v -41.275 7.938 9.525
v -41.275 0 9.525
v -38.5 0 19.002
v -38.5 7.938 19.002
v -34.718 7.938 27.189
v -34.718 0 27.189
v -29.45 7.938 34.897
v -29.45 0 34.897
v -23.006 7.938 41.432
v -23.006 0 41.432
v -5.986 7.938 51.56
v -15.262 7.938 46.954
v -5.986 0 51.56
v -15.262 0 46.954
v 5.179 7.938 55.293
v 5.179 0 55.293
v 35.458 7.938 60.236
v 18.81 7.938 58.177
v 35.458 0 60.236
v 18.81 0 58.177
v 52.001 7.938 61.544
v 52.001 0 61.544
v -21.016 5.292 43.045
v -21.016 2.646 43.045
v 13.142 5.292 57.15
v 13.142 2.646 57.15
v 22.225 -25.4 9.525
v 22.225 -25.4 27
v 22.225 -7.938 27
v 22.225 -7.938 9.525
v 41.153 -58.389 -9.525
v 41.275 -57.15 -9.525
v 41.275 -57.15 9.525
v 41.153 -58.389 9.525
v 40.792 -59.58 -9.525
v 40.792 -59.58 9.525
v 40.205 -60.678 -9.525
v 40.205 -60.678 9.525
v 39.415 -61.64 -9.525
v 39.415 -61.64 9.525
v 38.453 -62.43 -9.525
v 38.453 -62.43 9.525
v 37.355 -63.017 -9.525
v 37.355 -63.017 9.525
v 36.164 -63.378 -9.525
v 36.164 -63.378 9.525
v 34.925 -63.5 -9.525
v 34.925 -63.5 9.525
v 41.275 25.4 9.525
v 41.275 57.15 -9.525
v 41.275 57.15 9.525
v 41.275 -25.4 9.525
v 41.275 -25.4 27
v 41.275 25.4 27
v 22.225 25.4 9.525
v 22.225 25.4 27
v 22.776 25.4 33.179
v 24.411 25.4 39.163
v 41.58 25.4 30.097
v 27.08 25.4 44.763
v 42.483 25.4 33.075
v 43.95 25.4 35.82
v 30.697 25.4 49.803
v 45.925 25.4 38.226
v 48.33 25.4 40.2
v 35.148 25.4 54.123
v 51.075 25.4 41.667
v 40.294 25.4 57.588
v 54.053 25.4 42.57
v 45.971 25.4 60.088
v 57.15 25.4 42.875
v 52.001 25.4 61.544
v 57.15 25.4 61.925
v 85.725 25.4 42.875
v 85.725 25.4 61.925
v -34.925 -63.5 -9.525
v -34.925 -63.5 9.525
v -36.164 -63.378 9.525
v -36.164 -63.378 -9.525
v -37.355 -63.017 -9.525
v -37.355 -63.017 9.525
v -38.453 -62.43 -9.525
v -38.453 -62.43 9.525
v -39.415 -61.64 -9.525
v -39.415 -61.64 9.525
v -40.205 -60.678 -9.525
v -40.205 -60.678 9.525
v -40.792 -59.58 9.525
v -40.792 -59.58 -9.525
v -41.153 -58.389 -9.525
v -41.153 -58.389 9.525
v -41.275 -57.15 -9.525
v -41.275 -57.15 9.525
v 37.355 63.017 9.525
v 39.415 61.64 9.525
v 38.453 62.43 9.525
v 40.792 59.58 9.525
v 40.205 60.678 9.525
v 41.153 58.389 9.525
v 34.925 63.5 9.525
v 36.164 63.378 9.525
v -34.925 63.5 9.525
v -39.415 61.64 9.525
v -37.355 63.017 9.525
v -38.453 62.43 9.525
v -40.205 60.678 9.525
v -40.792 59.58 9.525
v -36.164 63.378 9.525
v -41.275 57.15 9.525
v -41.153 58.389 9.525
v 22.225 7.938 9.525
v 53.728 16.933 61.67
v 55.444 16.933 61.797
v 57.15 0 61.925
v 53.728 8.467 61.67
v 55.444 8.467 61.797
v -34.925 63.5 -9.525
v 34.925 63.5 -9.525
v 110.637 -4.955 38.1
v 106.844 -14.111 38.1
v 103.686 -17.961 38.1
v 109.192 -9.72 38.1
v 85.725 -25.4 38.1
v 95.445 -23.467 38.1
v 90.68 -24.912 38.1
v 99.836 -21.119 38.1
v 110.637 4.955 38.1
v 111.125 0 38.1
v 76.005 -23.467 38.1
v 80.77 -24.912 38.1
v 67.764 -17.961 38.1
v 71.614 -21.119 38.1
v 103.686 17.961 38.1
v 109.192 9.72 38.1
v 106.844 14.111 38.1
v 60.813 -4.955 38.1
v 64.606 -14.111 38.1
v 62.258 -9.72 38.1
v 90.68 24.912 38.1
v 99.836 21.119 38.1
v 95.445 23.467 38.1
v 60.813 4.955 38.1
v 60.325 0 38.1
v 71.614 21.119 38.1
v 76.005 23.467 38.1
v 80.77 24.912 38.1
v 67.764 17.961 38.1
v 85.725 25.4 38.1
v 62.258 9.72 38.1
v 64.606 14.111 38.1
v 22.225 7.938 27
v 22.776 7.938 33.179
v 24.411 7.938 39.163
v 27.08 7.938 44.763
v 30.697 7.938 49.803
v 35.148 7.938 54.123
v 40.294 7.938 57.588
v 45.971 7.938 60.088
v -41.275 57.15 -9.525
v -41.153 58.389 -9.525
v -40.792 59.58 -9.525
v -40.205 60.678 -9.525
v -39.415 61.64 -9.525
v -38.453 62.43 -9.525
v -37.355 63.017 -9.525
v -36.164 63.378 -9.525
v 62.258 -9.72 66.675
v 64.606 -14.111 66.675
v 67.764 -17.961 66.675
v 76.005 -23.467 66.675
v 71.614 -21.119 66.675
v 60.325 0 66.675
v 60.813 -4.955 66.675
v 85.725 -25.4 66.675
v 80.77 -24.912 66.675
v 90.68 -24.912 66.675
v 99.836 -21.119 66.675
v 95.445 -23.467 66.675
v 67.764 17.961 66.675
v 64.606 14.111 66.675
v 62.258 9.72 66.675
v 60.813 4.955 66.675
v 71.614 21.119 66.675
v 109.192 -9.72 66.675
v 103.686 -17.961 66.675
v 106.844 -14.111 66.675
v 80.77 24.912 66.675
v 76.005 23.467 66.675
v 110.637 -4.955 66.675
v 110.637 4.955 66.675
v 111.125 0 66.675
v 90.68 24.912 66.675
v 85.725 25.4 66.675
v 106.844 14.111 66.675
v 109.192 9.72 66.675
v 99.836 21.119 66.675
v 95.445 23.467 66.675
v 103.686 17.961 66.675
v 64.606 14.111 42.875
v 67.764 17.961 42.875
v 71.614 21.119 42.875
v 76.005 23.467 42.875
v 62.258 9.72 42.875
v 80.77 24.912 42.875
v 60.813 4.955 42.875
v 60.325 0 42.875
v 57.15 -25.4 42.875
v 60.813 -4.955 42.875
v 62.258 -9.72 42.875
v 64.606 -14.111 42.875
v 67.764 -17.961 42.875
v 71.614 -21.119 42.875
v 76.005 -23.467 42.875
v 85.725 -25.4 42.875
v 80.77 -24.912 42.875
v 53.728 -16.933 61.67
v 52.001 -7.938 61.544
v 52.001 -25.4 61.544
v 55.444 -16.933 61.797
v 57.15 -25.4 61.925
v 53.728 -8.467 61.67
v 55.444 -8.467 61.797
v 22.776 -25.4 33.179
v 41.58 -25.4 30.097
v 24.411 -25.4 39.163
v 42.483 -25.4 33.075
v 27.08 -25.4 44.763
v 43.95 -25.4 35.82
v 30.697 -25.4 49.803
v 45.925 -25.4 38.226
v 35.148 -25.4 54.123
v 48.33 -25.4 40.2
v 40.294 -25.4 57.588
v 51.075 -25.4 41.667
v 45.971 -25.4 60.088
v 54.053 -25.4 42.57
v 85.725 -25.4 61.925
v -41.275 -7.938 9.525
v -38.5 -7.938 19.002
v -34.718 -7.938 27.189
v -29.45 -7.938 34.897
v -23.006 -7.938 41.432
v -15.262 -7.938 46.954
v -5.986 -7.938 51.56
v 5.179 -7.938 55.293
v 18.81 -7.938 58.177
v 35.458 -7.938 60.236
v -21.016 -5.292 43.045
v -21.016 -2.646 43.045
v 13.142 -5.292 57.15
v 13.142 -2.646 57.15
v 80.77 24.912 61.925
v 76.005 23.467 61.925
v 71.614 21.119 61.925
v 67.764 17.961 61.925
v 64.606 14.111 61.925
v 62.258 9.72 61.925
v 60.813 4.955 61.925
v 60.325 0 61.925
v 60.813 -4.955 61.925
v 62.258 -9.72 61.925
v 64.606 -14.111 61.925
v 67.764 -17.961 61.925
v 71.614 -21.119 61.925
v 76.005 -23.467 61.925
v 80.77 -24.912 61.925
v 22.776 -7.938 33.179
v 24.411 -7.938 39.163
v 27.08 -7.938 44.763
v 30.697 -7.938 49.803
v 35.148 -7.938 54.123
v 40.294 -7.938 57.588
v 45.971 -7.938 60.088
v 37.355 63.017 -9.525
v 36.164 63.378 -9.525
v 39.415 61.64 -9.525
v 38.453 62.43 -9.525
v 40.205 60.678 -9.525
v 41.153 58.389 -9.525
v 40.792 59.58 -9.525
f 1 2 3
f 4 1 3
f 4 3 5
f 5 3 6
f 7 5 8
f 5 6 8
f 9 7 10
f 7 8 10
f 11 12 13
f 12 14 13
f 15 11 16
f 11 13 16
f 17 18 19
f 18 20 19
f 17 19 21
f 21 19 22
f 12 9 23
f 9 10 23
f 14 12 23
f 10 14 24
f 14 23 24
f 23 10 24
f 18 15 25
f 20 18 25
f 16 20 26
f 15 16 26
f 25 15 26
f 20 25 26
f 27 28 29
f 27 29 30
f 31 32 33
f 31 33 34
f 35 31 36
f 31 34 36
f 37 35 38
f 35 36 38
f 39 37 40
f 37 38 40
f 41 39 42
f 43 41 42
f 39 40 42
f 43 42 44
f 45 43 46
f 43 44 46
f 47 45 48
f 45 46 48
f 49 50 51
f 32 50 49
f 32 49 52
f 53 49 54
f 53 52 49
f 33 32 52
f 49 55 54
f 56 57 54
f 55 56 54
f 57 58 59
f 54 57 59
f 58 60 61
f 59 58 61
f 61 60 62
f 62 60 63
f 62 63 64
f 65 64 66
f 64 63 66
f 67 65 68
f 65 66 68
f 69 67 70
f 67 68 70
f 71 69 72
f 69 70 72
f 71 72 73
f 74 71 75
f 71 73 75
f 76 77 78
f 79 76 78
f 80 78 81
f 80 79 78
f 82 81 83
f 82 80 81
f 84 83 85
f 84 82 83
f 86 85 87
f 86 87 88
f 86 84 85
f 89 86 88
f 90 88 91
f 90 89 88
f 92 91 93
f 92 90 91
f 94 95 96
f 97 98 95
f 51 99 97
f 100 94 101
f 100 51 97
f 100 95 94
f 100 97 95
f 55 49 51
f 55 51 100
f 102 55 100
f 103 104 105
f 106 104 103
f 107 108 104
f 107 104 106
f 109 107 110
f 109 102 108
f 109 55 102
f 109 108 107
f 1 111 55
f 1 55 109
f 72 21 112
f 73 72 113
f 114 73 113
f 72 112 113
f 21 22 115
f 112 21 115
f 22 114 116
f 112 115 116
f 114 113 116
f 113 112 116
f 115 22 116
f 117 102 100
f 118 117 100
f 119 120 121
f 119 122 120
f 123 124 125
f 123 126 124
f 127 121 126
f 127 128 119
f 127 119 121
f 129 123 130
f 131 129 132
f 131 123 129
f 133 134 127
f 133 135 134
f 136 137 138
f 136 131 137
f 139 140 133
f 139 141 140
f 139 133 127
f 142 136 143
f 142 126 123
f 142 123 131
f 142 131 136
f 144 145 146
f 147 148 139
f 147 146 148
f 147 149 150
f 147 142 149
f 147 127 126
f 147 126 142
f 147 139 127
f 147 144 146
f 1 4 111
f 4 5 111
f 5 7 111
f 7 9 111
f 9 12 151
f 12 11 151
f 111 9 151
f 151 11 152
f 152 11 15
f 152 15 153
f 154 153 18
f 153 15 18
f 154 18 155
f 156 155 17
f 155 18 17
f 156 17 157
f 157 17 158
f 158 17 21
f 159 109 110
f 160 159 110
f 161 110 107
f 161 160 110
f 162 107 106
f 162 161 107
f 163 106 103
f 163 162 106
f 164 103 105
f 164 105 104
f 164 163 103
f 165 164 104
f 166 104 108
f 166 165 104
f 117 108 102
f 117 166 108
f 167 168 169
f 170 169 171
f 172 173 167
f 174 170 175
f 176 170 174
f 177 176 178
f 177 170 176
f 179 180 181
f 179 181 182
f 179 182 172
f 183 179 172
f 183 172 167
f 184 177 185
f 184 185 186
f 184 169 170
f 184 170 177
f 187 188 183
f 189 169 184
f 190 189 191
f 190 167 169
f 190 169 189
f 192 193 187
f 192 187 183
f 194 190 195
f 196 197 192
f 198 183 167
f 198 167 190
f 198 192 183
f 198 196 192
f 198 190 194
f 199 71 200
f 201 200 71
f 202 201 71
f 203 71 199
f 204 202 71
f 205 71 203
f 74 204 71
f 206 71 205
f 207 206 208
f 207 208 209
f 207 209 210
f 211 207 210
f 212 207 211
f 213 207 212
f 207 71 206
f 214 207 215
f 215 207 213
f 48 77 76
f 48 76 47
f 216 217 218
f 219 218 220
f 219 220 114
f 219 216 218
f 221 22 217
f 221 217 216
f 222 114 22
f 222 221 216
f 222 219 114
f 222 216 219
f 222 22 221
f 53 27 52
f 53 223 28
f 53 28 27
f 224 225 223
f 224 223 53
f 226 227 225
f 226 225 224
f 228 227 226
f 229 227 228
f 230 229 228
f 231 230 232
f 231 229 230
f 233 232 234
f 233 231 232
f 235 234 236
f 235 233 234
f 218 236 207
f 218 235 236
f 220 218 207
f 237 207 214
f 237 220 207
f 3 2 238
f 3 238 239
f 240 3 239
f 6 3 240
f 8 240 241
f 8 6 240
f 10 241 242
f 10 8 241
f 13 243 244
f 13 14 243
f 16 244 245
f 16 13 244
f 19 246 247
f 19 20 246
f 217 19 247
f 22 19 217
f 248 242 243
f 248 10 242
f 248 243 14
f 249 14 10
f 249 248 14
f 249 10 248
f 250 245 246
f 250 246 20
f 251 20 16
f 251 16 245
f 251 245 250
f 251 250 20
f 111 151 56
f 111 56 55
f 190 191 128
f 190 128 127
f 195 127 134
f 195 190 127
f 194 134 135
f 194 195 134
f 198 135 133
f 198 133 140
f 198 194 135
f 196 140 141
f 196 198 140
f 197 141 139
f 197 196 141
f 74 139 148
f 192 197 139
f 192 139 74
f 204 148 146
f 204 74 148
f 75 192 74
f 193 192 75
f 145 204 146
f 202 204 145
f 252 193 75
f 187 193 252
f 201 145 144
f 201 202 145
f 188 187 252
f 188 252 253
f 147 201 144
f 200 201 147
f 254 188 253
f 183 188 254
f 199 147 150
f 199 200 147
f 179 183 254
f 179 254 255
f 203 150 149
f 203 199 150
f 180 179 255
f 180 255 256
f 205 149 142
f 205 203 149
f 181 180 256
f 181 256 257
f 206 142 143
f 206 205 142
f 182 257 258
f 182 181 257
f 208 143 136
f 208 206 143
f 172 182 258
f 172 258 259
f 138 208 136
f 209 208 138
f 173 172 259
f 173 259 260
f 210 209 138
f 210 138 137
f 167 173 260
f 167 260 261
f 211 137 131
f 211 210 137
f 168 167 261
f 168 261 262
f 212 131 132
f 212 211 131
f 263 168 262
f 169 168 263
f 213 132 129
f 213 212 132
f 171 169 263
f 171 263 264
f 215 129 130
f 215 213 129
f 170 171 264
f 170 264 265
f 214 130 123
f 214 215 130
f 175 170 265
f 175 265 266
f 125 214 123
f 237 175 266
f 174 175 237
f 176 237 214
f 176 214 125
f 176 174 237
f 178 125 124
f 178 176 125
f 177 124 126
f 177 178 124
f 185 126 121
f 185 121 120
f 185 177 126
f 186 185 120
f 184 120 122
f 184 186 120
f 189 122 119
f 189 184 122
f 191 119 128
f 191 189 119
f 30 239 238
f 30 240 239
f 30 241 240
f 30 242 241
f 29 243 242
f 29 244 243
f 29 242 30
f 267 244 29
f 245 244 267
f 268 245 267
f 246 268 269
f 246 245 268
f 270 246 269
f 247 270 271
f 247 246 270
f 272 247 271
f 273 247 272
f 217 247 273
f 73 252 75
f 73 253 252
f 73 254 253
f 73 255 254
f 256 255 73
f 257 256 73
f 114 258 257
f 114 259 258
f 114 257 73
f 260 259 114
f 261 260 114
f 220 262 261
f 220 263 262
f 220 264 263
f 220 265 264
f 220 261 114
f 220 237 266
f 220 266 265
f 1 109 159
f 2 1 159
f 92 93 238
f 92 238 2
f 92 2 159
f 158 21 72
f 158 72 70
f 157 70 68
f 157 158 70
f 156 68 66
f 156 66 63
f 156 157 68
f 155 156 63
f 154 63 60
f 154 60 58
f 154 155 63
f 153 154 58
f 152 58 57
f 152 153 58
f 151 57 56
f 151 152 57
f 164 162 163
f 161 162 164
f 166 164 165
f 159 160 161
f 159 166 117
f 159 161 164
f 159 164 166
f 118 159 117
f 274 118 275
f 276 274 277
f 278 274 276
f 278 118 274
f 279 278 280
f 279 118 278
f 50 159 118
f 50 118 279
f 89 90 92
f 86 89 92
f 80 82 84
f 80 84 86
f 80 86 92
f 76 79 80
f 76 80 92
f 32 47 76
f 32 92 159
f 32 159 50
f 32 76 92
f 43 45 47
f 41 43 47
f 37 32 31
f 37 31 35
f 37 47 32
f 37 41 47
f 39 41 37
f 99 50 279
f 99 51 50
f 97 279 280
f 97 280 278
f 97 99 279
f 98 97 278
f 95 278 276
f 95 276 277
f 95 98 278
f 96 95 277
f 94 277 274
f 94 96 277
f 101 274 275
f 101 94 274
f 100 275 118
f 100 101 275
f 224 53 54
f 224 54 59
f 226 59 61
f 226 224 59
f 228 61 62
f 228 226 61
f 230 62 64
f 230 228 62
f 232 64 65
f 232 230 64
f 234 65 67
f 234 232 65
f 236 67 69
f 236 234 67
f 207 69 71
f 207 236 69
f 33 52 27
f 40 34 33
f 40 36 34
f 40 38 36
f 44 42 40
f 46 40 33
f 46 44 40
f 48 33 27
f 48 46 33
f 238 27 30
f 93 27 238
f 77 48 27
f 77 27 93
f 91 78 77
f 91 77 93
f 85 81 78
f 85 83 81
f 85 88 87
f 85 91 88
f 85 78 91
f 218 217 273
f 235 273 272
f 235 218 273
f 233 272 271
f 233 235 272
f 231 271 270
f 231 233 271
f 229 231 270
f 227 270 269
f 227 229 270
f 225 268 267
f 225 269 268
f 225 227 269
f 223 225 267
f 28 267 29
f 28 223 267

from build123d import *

# Parameters (mm, degrees)
F1_DEPTH = 63.5
F2_DEPTH = 25.4
F3_DEPTH = 7.9375
F5_R     = 6.35


with BuildPart() as f1:
    # F0 (on Front) → F1 (new body, symmetric)
    with BuildSketch(Plane.XZ):
        Polygon((41.275, -9.525), (41.275, 9.525), (22.225, 9.525), (-41.275, 9.525), (-41.275, -9.525), align=None)
    extrude(amount=F1_DEPTH, both=True)

    # F0 (on Front) → F2 (join, symmetric)
    with BuildSketch(Plane.XZ):
        with BuildLine():
            Line((22.225, 9.525), (41.275, 9.525))
            Line((41.275, 9.525), (41.275, 27.0002))
            ThreePointArc((41.275, 27.0002), (45.92468, 38.22552), (57.15, 42.8752))
            Line((57.15, 42.8752), (60.325, 42.8752))
            Line((60.325, 42.8752), (60.325, 61.9252))
            Line((60.325, 61.9252), (57.15, 61.9252))
            add(Edge.make_bspline(
                [(52.001332, 61.543605), (53.732744, 61.669465), (55.450257, 61.795302), (57.15, 61.9252)],
                knots=[106.66287, 106.66287, 106.66287, 106.66287, 111.504536, 111.504536, 111.504536, 111.504536], degree=3))
            ThreePointArc((52.001332, 61.543605), (30.696523, 49.803033), (22.225, 27.0002))
            Line((22.225, 27.0002), (22.225, 9.525))
        make_face()
        Polygon((60.325, 61.9252), (60.325, 42.8752), (73.367334, 42.8752), (85.725, 42.8752), (85.725, 61.9252), (73.367334, 61.9252), align=None)
    extrude(amount=F2_DEPTH, both=True)

    # F0 (on Front) → F3 (join, symmetric)
    with BuildSketch(Plane.XZ):
        with BuildLine():
            Line((-41.275, 9.525), (22.225, 9.525))
            Line((22.225, 9.525), (22.225, 27.0002))
            ThreePointArc((22.225, 27.0002), (30.696523, 49.803033), (52.001332, 61.543605))
            add(Edge.make_bspline(
                [(-41.275, 9.525), (-31.030923, 55.987171), (13.857985, 58.770894), (52.001332, 61.543605)],
                knots=[0, 0, 0, 0, 106.66287, 106.66287, 106.66287, 106.66287], degree=3))
        make_face()
    extrude(amount=F3_DEPTH, both=True)

    # F0 (on Front) → F4 (revolve)
    with BuildSketch(Plane.XZ):
        Polygon((85.725, 42.8752), (85.725, 38.1), (111.125, 38.1), (111.125, 66.675), (85.725, 66.675), (85.725, 61.9252), align=None)
    revolve(axis=Axis((85.725, 0, 52.3875), (0, 0, 1)))

    # F5
    f5_edges = [f1.edges().sort_by_distance(p)[0] for p in [
        (41.275, -63.5, 0),
        (-41.275, -63.5, 0),
        (-41.275, 63.5, 0),
        (41.275, 63.5, 0),
    ]]
    fillet(f5_edges, radius=F5_R)


solid = f1.part
